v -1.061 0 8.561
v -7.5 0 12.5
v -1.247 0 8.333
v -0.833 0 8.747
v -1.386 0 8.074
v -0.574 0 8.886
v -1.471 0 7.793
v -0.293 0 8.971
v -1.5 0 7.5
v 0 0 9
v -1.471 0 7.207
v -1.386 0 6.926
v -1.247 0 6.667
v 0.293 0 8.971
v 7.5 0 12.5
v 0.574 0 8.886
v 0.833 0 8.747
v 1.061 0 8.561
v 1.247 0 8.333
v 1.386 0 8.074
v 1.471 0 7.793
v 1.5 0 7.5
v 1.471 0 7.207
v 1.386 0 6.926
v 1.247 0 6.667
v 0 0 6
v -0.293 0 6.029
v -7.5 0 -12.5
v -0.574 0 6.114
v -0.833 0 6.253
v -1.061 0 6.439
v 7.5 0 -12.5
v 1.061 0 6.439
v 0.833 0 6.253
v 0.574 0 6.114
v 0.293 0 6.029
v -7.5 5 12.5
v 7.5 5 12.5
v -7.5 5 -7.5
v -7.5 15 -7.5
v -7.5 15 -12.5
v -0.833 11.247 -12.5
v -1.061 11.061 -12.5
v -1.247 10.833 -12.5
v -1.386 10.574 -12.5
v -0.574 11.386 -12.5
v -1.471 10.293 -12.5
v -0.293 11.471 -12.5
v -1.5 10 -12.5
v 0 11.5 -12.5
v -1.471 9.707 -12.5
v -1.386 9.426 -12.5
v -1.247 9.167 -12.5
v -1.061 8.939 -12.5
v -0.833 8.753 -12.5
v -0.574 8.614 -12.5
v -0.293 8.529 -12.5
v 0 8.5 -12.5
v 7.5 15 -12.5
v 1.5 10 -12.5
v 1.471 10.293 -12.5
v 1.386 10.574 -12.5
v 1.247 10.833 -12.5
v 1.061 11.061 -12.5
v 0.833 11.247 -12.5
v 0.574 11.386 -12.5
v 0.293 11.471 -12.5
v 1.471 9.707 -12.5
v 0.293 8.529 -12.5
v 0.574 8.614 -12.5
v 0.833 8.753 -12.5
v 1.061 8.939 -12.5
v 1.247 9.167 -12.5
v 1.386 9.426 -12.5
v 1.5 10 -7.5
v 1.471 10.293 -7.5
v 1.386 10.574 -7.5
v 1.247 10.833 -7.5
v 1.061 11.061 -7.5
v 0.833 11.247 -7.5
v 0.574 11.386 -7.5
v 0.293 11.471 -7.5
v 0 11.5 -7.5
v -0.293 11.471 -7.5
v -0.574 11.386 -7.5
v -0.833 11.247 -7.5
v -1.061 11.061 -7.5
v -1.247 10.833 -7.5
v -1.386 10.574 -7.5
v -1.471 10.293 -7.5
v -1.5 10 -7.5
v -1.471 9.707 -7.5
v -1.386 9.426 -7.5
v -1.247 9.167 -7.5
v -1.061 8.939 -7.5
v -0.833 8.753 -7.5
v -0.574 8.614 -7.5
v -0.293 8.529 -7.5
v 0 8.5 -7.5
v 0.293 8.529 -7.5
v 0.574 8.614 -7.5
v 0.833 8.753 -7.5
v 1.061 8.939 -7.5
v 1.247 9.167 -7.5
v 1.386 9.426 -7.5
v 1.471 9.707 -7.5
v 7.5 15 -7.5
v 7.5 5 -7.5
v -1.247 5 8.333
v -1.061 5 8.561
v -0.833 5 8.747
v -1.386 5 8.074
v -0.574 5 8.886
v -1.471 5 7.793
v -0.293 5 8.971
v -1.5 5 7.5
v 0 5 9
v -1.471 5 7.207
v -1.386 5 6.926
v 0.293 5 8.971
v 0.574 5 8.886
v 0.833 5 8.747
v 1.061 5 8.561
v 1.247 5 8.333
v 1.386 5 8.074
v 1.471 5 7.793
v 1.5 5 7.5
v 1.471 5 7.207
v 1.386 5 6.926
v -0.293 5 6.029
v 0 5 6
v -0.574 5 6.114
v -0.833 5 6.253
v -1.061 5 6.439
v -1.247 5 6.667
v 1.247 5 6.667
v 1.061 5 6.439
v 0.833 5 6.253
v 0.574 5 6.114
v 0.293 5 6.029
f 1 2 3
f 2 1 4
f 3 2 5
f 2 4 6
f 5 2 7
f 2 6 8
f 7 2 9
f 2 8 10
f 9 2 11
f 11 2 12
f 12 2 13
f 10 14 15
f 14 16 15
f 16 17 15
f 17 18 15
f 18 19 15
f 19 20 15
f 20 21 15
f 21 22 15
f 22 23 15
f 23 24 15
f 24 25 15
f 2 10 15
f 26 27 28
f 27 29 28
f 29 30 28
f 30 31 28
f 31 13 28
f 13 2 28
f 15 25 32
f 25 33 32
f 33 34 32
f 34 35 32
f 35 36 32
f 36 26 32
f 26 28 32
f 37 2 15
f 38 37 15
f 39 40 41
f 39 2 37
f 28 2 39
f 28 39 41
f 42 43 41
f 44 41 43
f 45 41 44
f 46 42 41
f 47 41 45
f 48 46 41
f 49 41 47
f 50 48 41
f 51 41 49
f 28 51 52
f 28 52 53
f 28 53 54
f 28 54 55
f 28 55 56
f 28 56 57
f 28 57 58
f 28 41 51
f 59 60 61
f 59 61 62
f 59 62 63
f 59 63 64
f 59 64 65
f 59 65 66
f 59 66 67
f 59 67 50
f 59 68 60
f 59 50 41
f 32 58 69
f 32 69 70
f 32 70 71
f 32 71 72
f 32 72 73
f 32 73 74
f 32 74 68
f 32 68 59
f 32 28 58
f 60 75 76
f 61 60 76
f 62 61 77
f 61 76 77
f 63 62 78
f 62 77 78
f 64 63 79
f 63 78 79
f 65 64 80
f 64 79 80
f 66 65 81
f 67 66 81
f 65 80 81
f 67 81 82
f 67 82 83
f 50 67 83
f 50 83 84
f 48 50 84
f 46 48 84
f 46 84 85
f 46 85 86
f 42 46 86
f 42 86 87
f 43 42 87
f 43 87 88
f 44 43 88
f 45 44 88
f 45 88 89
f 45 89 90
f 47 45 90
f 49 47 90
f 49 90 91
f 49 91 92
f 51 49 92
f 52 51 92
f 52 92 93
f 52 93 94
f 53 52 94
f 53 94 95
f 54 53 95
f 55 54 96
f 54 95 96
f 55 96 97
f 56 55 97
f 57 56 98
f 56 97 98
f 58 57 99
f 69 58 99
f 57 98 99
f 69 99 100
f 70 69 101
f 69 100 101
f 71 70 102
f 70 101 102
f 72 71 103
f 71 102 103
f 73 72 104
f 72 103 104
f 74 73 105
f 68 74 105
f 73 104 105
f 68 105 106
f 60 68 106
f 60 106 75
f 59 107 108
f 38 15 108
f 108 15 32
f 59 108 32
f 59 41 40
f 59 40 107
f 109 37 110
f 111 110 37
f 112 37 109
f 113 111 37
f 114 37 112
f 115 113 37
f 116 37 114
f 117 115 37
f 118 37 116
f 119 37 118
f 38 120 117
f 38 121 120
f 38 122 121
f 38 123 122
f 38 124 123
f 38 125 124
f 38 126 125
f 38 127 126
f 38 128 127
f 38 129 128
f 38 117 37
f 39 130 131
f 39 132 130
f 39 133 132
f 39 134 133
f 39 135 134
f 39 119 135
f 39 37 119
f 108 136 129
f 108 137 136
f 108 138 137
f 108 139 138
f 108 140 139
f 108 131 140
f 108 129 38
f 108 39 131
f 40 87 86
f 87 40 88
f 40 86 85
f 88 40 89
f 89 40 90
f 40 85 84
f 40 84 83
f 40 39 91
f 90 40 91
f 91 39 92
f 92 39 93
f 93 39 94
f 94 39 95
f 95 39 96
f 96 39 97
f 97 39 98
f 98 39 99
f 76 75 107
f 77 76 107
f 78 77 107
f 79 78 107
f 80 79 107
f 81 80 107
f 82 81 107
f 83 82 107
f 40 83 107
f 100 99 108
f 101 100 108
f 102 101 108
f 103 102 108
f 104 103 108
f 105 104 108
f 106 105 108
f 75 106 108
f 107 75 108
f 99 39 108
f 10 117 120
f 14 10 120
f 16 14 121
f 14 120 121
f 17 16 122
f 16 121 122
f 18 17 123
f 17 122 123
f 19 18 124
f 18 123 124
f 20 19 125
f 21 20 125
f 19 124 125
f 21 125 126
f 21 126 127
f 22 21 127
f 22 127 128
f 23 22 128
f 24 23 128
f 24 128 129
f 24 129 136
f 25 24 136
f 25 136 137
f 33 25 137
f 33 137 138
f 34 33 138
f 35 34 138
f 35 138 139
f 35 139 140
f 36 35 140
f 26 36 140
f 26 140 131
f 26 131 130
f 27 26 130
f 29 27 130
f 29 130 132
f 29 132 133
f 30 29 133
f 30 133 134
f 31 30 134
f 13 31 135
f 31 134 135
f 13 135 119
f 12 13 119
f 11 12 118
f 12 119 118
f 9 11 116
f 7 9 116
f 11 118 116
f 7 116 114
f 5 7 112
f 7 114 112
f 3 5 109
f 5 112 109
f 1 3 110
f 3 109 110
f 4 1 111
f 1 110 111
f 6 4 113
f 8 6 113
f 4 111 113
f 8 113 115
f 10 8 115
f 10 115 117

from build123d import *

# Parameters (mm, degrees)
SKETCH1_W      = 15
SKETCH1_H      = 25
EXTRUDE1_DEPTH = 5
SKETCH2_W      = 15
SKETCH2_H      = 5
EXTRUDE2_DEPTH = 10
SKETCH3_R      = 1.5
EXTRUDE3_DEPTH = 10
SKETCH4_R      = 1.5
EXTRUDE4_DEPTH = 10


with BuildPart() as part:
    # Sketch1 → Extrude1 (new body)
    with BuildSketch(Plane(origin=(0, 0, 0), x_dir=(1, 0, 0), z_dir=(0, 1, 0))):
        Rectangle(SKETCH1_W, SKETCH1_H)
    extrude(amount=EXTRUDE1_DEPTH)

    # Sketch2 → Extrude2 (add)
    with BuildSketch(Plane(origin=(0, 5, 0), x_dir=(1, 0, 0), z_dir=(0, 1, 0))):
        with Locations((0, 10)):
            Rectangle(SKETCH2_W, SKETCH2_H)
    extrude(amount=EXTRUDE2_DEPTH)

    # Sketch3 → Extrude3 (cut)
    with BuildSketch(Plane(origin=(0, 5, 0), x_dir=(1, 0, 0), z_dir=(0, 1, 0))):
        with Locations(Location((0, -7.5, 0), (0, 0, 270))):
            Circle(SKETCH3_R)
    extrude(amount=-EXTRUDE3_DEPTH, mode=Mode.SUBTRACT)

    # Sketch4 → Extrude4 (cut)
    with BuildSketch(Plane.XY.offset(-7.5)):
        with Locations((0, 10)):
            Circle(SKETCH4_R)
    extrude(amount=-EXTRUDE4_DEPTH, mode=Mode.SUBTRACT)


solid = part.part
